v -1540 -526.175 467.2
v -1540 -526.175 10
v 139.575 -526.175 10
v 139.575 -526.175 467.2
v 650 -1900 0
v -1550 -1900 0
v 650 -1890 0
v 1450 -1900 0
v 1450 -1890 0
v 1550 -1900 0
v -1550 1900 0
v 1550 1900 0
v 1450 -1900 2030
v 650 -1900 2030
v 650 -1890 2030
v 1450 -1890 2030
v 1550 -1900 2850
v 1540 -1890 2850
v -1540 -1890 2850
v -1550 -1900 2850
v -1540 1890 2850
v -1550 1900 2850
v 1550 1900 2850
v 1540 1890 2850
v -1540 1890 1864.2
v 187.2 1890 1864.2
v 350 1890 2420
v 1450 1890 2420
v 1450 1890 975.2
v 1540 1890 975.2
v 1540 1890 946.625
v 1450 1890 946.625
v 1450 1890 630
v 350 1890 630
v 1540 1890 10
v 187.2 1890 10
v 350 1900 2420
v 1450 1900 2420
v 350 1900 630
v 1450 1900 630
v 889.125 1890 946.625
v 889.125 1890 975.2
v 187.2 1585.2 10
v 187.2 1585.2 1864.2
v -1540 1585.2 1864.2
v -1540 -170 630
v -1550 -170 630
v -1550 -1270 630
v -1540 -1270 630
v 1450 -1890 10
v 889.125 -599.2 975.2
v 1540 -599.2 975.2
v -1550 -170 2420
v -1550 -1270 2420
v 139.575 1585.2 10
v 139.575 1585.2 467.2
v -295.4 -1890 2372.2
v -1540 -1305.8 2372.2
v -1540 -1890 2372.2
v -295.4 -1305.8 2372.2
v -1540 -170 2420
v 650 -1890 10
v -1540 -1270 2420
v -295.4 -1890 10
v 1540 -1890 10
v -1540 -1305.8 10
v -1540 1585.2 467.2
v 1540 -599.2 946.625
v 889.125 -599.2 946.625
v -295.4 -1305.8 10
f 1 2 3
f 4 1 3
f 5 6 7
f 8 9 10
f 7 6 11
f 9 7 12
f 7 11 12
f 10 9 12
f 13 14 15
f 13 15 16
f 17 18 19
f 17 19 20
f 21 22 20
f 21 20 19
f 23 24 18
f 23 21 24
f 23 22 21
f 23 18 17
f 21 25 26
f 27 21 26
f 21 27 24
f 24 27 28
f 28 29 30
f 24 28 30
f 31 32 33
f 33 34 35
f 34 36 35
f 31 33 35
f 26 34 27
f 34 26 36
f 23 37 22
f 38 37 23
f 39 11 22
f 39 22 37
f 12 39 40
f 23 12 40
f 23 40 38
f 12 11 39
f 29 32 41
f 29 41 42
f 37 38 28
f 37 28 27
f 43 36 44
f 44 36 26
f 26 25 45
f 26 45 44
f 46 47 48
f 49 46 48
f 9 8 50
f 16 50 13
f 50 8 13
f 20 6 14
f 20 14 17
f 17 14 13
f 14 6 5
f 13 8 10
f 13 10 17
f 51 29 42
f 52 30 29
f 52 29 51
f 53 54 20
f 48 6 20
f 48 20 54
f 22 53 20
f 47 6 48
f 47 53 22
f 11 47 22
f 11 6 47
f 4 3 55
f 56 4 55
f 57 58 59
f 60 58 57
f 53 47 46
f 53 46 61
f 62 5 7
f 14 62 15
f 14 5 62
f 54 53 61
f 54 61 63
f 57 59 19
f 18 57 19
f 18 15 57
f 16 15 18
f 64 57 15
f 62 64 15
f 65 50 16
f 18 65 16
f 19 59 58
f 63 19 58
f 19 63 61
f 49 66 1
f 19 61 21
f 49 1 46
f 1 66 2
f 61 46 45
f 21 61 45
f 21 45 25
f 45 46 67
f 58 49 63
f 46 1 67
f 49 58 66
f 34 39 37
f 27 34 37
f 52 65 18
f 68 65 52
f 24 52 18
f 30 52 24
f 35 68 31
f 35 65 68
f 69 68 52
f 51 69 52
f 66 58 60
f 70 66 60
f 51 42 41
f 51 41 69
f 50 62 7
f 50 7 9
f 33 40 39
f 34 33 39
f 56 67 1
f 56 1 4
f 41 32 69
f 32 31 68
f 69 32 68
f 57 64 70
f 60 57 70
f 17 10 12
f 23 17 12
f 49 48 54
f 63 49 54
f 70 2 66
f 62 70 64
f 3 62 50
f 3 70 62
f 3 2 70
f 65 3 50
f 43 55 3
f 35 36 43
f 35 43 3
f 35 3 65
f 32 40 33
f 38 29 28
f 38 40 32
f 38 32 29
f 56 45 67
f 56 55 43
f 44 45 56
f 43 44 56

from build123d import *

# Parameters (mm, degrees)
F0_W      = 3100
F0_H      = 3800
F1_DEPTH  = 2850
F2_T      = -10
F3_W      = 800
F3_H      = 2030
F4_DEPTH  = 10
F5_W      = 1100
F5_H      = 1790
F6_DEPTH  = 10
F7_W      = 1100
F7_H      = 1790
F8_DEPTH  = 10
F9_W      = 1244.6
F9_H      = 584.2
F10_DEPTH = 2362.2
F11_W     = 1727.2
F11_H     = 1854.2
F12_DEPTH = 304.8
F13_W     = 2489.2
F13_H     = 28.575
F14_DEPTH = 650.875
F15_W     = 1679.575
F15_H     = 2111.375
F16_DEPTH = 457.2


with BuildPart() as f1:
    # F0 (on Top) → F1 (new body)
    with BuildSketch(Plane.XY):
        Rectangle(F0_W, F0_H)
    extrude(amount=F1_DEPTH)

    # F2
    f2_openings = [f1.faces().sort_by_distance(p)[0] for p in [
        (0, 0, 2850),
    ]]
    offset(amount=F2_T, openings=f2_openings)

    # F3 (on face) → F4 (cut)
    with BuildSketch(Plane.XZ.offset(1900)):
        with Locations((1050, 1015)):
            Rectangle(F3_W, F3_H)
    extrude(amount=-F4_DEPTH, mode=Mode.SUBTRACT)

    # F5 (on face) → F6 (cut)
    with BuildSketch(Plane(origin=(-1550, 0, 0), x_dir=(0, -1, 0), z_dir=(-1, 0, 0))):
        with Locations((720, 1525)):
            Rectangle(F5_W, F5_H)
    extrude(amount=-F6_DEPTH, mode=Mode.SUBTRACT)

    # F7 (on face) → F8 (cut)
    with BuildSketch(Plane(origin=(0, 1900, 0), x_dir=(-1, 0, 0), z_dir=(0, 1, 0))):
        with Locations((-900, 1525)):
            Rectangle(F7_W, F7_H)
    extrude(amount=-F8_DEPTH, mode=Mode.SUBTRACT)

    # F9 (on face) → F10 (join)
    with BuildSketch(Plane.XY.offset(10)):
        with Locations((-917.7, -1597.9)):
            Rectangle(F9_W, F9_H)
    extrude(amount=F10_DEPTH)

    # F11 (on face) → F12 (join)
    with BuildSketch(Plane.XZ.offset(-1890)):
        with Locations((-676.4, 937.1)):
            Rectangle(F11_W, F11_H)
    extrude(amount=F12_DEPTH)

    # F13 (on face) → F14 (join)
    with BuildSketch(Plane(origin=(1540, 0, 0), x_dir=(0, -1, 0), z_dir=(-1, 0, 0))):
        with Locations((-645.4, 960.9125)):
            Rectangle(F13_W, F13_H)
    extrude(amount=F14_DEPTH)

    # F15 (on face) → F16 (join)
    with BuildSketch(Plane.XY.offset(10)):
        with Locations((-700.2125, 529.5125)):
            Rectangle(F15_W, F15_H)
    extrude(amount=F16_DEPTH)


solid = f1.part
